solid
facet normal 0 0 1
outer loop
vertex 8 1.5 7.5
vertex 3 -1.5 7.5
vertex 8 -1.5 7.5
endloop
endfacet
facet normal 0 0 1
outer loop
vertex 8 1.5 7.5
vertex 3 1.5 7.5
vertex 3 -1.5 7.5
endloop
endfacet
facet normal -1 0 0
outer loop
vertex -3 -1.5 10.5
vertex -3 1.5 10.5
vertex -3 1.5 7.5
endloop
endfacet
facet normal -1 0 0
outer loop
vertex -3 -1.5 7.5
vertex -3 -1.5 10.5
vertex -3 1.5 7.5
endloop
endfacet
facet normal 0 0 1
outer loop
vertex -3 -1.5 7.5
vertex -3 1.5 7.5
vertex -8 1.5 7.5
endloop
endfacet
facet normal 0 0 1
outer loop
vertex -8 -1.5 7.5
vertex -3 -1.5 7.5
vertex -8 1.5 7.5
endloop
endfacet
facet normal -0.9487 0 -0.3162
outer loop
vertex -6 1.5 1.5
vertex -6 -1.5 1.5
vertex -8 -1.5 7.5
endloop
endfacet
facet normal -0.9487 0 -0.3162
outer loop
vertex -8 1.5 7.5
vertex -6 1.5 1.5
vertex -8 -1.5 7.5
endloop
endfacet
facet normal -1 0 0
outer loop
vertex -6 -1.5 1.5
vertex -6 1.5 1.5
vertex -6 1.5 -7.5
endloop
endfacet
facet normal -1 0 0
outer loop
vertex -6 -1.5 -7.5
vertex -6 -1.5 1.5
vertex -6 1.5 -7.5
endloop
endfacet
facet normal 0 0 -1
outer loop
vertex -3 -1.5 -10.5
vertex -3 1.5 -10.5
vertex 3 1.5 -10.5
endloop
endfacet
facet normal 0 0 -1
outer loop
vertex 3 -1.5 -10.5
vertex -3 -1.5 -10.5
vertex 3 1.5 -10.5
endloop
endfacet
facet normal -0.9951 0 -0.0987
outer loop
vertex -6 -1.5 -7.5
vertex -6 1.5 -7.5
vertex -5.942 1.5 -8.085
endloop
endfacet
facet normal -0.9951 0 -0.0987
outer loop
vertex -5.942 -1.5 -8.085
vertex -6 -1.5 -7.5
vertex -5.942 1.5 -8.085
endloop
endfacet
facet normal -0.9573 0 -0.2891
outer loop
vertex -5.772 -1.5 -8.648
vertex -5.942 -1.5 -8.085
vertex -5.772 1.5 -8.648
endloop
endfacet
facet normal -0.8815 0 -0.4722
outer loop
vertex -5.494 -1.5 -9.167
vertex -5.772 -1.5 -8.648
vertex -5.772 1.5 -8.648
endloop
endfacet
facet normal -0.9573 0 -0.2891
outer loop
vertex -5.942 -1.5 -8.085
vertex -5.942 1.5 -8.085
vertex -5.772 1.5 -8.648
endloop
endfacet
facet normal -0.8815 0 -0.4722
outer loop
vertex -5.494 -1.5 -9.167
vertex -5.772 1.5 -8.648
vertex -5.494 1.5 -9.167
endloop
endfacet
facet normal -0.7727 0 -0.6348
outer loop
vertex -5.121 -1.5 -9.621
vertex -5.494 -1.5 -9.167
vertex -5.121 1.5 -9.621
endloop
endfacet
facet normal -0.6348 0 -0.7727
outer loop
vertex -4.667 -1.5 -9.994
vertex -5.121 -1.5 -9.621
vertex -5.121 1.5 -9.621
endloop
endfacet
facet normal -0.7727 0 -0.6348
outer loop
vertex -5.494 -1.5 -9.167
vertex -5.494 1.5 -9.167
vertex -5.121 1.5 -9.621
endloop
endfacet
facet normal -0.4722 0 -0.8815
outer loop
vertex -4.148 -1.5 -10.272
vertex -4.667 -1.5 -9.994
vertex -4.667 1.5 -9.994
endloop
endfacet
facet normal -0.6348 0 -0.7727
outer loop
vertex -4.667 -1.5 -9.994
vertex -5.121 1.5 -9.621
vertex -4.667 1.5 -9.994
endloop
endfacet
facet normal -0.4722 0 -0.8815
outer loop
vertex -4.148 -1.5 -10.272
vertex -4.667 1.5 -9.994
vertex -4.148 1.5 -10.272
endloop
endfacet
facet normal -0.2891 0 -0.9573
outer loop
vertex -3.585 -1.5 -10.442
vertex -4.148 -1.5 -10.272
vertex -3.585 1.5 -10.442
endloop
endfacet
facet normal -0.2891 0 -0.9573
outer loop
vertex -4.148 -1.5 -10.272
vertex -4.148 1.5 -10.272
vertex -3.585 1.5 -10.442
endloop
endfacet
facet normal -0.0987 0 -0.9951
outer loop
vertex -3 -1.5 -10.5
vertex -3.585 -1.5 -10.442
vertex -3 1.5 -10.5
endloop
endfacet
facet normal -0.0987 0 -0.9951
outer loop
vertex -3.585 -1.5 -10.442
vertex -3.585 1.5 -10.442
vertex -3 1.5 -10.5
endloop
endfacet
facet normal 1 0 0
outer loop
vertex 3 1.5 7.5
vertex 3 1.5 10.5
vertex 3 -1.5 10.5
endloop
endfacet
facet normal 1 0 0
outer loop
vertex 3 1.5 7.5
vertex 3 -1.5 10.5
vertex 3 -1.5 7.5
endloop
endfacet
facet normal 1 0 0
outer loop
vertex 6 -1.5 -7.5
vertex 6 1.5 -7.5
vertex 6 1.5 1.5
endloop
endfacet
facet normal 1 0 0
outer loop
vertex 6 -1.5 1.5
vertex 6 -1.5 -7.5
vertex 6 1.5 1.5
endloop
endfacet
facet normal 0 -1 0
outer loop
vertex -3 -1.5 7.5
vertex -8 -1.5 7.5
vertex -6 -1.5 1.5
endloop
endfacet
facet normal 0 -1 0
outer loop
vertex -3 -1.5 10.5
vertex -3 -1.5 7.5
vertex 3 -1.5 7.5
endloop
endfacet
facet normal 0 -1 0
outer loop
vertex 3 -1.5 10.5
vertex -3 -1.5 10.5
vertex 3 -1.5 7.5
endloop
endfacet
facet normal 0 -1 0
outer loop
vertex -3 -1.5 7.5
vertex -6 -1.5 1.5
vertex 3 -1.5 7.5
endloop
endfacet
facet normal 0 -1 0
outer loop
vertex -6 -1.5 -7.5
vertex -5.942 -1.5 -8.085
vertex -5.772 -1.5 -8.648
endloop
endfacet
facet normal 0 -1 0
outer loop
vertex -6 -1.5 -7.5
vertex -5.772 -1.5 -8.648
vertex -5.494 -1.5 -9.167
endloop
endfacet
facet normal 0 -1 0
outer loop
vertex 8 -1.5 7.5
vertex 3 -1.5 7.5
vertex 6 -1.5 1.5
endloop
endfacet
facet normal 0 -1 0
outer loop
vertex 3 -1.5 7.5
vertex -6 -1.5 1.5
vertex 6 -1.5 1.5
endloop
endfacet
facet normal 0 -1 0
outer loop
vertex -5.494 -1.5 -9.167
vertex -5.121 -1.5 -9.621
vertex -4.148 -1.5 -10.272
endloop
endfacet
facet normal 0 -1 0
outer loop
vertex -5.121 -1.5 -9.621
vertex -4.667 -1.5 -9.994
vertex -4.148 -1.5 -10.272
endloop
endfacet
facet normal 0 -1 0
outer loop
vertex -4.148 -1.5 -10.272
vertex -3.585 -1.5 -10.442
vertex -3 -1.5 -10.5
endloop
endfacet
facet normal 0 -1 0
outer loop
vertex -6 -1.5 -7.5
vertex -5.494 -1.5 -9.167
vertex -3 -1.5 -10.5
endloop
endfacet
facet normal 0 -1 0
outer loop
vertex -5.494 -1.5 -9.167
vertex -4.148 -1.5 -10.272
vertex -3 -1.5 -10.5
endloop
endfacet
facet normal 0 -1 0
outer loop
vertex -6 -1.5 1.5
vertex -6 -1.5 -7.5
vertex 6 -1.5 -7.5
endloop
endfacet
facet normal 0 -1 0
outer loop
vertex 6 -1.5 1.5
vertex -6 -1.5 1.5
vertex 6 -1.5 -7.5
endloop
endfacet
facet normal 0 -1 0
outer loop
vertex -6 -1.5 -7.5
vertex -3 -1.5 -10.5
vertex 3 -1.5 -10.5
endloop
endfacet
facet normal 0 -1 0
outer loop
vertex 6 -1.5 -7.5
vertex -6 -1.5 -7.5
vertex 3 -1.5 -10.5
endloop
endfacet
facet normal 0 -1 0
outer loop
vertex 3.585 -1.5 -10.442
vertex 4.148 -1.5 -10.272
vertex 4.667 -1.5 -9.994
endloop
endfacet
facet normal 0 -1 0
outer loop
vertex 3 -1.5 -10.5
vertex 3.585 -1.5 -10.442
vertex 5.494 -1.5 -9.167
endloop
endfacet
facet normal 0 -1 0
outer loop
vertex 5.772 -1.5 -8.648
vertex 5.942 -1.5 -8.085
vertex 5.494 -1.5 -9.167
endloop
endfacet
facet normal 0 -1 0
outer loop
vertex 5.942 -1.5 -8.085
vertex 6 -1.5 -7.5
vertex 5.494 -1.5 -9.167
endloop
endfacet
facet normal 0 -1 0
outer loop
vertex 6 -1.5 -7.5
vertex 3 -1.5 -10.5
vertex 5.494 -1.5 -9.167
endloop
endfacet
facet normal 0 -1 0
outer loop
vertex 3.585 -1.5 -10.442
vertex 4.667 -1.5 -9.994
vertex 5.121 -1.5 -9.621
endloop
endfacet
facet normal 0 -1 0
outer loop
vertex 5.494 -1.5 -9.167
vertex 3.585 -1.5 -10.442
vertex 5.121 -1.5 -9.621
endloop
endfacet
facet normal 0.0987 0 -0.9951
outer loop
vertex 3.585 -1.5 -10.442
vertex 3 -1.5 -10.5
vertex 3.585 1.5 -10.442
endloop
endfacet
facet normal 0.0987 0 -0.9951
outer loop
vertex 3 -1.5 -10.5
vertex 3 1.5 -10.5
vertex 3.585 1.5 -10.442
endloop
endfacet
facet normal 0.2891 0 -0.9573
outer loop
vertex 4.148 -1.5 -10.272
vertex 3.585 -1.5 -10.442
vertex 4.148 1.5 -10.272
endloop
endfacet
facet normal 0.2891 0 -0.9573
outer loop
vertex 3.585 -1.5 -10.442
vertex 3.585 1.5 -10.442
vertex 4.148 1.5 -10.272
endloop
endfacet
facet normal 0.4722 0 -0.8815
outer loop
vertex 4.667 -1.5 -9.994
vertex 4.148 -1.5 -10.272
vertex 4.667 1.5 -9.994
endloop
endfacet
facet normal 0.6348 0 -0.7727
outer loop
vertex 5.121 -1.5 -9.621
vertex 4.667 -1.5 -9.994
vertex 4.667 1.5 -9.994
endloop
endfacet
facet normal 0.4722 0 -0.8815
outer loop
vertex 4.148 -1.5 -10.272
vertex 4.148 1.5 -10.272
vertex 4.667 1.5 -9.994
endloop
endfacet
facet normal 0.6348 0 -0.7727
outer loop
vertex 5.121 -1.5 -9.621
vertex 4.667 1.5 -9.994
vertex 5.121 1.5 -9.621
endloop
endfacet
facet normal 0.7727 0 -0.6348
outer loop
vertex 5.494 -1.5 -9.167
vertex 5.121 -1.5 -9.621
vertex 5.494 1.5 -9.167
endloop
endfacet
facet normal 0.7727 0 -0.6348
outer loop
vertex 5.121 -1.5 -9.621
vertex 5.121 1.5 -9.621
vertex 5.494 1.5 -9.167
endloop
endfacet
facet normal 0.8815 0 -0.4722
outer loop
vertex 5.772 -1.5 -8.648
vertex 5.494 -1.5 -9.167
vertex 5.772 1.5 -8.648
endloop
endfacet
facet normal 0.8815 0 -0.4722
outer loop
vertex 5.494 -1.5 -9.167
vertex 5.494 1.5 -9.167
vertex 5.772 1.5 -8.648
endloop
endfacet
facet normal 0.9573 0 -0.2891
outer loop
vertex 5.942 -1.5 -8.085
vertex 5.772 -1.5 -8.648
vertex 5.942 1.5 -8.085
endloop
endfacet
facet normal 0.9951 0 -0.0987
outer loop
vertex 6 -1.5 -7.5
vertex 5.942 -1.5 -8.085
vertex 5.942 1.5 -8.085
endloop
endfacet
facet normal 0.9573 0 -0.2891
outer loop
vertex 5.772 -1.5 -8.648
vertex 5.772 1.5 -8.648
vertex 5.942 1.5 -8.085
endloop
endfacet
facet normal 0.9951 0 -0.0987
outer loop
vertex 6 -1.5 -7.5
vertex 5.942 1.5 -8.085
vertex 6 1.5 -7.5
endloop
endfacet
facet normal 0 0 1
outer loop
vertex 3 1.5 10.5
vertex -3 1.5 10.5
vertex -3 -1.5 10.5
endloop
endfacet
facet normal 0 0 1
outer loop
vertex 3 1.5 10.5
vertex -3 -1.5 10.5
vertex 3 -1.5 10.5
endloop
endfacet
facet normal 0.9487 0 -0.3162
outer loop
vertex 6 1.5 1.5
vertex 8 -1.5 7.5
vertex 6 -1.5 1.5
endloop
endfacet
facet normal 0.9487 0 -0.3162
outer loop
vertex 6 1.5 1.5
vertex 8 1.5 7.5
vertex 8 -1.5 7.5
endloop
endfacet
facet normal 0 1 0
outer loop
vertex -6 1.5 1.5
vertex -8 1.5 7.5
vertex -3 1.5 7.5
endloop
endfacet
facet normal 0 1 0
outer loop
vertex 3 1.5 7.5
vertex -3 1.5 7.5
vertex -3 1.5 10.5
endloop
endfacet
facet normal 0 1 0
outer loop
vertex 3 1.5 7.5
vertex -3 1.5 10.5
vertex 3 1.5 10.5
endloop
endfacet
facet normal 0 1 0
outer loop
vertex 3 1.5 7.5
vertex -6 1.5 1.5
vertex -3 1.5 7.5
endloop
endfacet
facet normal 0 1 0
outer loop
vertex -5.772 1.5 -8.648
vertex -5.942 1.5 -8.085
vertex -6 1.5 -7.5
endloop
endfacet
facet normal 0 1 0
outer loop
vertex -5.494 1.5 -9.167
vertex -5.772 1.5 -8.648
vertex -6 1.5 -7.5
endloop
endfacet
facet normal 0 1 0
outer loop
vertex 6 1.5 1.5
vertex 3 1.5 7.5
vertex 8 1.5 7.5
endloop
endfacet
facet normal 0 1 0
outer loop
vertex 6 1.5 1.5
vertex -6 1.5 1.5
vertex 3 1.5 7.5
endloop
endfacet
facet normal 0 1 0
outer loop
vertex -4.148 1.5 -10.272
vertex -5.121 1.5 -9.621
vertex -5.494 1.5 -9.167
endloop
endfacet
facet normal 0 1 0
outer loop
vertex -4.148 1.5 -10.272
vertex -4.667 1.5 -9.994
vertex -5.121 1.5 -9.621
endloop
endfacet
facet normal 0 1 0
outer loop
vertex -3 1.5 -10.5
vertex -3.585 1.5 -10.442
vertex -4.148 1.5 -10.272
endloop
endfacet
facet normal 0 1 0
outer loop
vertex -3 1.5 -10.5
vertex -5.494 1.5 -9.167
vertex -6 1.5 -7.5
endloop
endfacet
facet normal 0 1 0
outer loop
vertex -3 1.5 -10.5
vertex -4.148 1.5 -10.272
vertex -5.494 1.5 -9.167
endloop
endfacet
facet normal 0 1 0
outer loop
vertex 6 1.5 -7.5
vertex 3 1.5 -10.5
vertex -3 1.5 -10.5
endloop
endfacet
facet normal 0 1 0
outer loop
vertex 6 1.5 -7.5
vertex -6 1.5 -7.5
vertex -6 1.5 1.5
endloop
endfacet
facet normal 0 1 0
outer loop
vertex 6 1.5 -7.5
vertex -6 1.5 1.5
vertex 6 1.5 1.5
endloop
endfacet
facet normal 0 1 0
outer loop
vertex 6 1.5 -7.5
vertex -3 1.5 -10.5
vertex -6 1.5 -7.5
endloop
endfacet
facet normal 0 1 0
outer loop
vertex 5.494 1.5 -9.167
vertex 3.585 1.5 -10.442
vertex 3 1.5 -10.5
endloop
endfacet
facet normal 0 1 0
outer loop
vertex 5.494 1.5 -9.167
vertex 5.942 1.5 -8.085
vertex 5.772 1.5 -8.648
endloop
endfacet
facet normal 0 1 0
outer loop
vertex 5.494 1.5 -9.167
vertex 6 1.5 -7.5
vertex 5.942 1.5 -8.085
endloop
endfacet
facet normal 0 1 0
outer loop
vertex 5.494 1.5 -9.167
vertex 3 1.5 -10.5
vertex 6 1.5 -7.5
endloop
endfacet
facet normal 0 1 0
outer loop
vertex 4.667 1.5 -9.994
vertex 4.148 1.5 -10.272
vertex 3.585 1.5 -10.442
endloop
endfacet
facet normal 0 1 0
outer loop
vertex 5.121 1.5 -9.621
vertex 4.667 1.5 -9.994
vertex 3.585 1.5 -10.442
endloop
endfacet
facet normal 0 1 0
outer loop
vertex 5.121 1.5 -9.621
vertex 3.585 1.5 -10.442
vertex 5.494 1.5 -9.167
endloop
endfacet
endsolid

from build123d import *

# Parameters (mm, degrees)
BOSS_EXTRUDE4_DEPTH = 1.5
SKETCH8_W           = 6
SKETCH8_H           = 3
BOSS_EXTRUDE5_DEPTH = 1.5
BOSS_EXTRUDE6_DEPTH = 1.5


with BuildPart() as part:
    # Sketch6 → Boss-Extrude4 (new body, symmetric)
    with BuildSketch(Plane(origin=(0, 0, 0), x_dir=(1, 0, 0), z_dir=(0, 1, 0))):
        with BuildLine():
            Line((-3, 10.5), (3, 10.5))
            ThreePointArc((3, 10.5), (5.121320344, 9.621320344), (6, 7.5))
            Line((6, 7.5), (6, -7.5))
            Line((6, -7.5), (-6, -7.5))
            Line((-6, -7.5), (-6, 7.5))
            ThreePointArc((-6, 7.5), (-5.121320344, 9.621320344), (-3, 10.5))
        make_face()
    extrude(amount=BOSS_EXTRUDE4_DEPTH, both=True)

    # Sketch8 → Boss-Extrude5 (add, symmetric)
    with BuildSketch(Plane(origin=(0, 0, 0), x_dir=(1, 0, 0), z_dir=(0, 1, 0))):
        with Locations((0, -9)):
            Rectangle(SKETCH8_W, SKETCH8_H)
    extrude(amount=BOSS_EXTRUDE5_DEPTH, both=True)

    # Sketch9 → Boss-Extrude6 (add, symmetric)
    with BuildSketch(Plane(origin=(0, 0, 0), x_dir=(1, 0, 0), z_dir=(0, 1, 0))):
        Polygon((-6, -1.5), (-8, -7.5), (-6, -7.5), align=None)
        Polygon((6, -1.5), (6, -7.5), (8, -7.5), align=None)
    extrude(amount=BOSS_EXTRUDE6_DEPTH, both=True)


solid = part.part
